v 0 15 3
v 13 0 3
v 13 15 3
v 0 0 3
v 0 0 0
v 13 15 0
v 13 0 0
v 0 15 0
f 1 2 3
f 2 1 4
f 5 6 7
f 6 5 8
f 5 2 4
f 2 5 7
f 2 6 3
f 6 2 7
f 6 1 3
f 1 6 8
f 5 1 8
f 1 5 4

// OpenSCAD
// Generated by SolidPython 1.0.1 on 2020-07-29 00:46:55


cube(size = [13, 15, 3]);
/***********************************************
*********      SolidPython code:      **********
************************************************
 
# import packages: SolidPython
from solid import *
from solid.utils import *
from itertools import chain, combinations, permutations


class Resize:

    def __init__(self, scad_file):
        self.scad_file = scad_file
        #self.scad_file = import_scad(scad_file)
        # cone/cylinder param:
        self.r1 = 0
        self.r2 = 0
        self.h = 0
        # rectangular prism param:
        self.w = 0
        self.l = 0
        # ellipse param:
        self.r = 0

    # import OpenScad code (file name corresponds to shape)


    # classify shape + parameters
    def assign(self, param1, param2, param3):
        if self.scad_file == 'cone.scad':
            self.r1 = param1
            self.r2 = param2
            self.h = param3
        elif self.scad_file == 'cylinder.scad':
            self.r1 = param1
            self.r2 = param2
            self.h = param3
        elif self.scad_file == 'rectangularPrism.scad':
            self.h = param1
            self.l = param2
            self.w = param3
        else:
            self.r = param1
            self.h = param2

    # resize parameters
    def iterate(self):
        x = range(3, 20, 2)
        i = 1
        if self.scad_file == 'cone.scad':
            tempList = list(permutations(x, 2))
            for temp in tempList:
                param1 = temp[0]
                param2 = temp[1]
                filepath = 'produced_scad_files/' + 'cone' + str(param1) + '_' + str(param2) + '_' + '.scad'
                scad_render_to_file(cylinder(h=param1, r1=param2, r2=0), filepath)

        elif self.scad_file == 'cylinder.scad':
            tempList = list(permutations(x, 3))
            for temp in tempList:
                param1 = temp[0]
                param2 = temp[1]
                filepath = 'produced_scad_files/' + 'cylinder' + str(param1) + '_' + str(param2) + '_' + '.scad'
                scad_render_to_file(cylinder(h=param1, r1=param2, r2=param2), filepath)

        elif self.scad_file == 'rectangularPrism.scad':
            tempList = list(permutations(x, 3))
            for temp in tempList:
                param1 = temp[0]
                param2 = temp[1]
                param3 = temp[2]
                filepath = 'produced_scad_files/' + 'rectangularPrism' + str(param1) + '_' + str(param2) + '_' + str(
                    param3) + '.scad'
                scad_render_to_file(cube(size=(param1, param2, param3)), filepath)

        elif self.scad_file == 'ellipse.scad':
            tempList = list(permutations(x, 4))
            for temp in tempList:
                param1 = temp[0]
                param2 = temp[1]
                param3 = temp[2]
                param4 = temp[3]
                filepath = 'produced_scad_files/' + 'ellipse' + str(param1) + '_' + str(param2) + '_' + str(param3) + '_' + str(param4) + '.scad'
                scad_render_to_file(scale([param1, param2, param3])(sphere(r=param4)), filepath)

    def render_to_scadfile(self):
        scad_render_to_file(scad, 'example.scad') 
 
************************************************/
